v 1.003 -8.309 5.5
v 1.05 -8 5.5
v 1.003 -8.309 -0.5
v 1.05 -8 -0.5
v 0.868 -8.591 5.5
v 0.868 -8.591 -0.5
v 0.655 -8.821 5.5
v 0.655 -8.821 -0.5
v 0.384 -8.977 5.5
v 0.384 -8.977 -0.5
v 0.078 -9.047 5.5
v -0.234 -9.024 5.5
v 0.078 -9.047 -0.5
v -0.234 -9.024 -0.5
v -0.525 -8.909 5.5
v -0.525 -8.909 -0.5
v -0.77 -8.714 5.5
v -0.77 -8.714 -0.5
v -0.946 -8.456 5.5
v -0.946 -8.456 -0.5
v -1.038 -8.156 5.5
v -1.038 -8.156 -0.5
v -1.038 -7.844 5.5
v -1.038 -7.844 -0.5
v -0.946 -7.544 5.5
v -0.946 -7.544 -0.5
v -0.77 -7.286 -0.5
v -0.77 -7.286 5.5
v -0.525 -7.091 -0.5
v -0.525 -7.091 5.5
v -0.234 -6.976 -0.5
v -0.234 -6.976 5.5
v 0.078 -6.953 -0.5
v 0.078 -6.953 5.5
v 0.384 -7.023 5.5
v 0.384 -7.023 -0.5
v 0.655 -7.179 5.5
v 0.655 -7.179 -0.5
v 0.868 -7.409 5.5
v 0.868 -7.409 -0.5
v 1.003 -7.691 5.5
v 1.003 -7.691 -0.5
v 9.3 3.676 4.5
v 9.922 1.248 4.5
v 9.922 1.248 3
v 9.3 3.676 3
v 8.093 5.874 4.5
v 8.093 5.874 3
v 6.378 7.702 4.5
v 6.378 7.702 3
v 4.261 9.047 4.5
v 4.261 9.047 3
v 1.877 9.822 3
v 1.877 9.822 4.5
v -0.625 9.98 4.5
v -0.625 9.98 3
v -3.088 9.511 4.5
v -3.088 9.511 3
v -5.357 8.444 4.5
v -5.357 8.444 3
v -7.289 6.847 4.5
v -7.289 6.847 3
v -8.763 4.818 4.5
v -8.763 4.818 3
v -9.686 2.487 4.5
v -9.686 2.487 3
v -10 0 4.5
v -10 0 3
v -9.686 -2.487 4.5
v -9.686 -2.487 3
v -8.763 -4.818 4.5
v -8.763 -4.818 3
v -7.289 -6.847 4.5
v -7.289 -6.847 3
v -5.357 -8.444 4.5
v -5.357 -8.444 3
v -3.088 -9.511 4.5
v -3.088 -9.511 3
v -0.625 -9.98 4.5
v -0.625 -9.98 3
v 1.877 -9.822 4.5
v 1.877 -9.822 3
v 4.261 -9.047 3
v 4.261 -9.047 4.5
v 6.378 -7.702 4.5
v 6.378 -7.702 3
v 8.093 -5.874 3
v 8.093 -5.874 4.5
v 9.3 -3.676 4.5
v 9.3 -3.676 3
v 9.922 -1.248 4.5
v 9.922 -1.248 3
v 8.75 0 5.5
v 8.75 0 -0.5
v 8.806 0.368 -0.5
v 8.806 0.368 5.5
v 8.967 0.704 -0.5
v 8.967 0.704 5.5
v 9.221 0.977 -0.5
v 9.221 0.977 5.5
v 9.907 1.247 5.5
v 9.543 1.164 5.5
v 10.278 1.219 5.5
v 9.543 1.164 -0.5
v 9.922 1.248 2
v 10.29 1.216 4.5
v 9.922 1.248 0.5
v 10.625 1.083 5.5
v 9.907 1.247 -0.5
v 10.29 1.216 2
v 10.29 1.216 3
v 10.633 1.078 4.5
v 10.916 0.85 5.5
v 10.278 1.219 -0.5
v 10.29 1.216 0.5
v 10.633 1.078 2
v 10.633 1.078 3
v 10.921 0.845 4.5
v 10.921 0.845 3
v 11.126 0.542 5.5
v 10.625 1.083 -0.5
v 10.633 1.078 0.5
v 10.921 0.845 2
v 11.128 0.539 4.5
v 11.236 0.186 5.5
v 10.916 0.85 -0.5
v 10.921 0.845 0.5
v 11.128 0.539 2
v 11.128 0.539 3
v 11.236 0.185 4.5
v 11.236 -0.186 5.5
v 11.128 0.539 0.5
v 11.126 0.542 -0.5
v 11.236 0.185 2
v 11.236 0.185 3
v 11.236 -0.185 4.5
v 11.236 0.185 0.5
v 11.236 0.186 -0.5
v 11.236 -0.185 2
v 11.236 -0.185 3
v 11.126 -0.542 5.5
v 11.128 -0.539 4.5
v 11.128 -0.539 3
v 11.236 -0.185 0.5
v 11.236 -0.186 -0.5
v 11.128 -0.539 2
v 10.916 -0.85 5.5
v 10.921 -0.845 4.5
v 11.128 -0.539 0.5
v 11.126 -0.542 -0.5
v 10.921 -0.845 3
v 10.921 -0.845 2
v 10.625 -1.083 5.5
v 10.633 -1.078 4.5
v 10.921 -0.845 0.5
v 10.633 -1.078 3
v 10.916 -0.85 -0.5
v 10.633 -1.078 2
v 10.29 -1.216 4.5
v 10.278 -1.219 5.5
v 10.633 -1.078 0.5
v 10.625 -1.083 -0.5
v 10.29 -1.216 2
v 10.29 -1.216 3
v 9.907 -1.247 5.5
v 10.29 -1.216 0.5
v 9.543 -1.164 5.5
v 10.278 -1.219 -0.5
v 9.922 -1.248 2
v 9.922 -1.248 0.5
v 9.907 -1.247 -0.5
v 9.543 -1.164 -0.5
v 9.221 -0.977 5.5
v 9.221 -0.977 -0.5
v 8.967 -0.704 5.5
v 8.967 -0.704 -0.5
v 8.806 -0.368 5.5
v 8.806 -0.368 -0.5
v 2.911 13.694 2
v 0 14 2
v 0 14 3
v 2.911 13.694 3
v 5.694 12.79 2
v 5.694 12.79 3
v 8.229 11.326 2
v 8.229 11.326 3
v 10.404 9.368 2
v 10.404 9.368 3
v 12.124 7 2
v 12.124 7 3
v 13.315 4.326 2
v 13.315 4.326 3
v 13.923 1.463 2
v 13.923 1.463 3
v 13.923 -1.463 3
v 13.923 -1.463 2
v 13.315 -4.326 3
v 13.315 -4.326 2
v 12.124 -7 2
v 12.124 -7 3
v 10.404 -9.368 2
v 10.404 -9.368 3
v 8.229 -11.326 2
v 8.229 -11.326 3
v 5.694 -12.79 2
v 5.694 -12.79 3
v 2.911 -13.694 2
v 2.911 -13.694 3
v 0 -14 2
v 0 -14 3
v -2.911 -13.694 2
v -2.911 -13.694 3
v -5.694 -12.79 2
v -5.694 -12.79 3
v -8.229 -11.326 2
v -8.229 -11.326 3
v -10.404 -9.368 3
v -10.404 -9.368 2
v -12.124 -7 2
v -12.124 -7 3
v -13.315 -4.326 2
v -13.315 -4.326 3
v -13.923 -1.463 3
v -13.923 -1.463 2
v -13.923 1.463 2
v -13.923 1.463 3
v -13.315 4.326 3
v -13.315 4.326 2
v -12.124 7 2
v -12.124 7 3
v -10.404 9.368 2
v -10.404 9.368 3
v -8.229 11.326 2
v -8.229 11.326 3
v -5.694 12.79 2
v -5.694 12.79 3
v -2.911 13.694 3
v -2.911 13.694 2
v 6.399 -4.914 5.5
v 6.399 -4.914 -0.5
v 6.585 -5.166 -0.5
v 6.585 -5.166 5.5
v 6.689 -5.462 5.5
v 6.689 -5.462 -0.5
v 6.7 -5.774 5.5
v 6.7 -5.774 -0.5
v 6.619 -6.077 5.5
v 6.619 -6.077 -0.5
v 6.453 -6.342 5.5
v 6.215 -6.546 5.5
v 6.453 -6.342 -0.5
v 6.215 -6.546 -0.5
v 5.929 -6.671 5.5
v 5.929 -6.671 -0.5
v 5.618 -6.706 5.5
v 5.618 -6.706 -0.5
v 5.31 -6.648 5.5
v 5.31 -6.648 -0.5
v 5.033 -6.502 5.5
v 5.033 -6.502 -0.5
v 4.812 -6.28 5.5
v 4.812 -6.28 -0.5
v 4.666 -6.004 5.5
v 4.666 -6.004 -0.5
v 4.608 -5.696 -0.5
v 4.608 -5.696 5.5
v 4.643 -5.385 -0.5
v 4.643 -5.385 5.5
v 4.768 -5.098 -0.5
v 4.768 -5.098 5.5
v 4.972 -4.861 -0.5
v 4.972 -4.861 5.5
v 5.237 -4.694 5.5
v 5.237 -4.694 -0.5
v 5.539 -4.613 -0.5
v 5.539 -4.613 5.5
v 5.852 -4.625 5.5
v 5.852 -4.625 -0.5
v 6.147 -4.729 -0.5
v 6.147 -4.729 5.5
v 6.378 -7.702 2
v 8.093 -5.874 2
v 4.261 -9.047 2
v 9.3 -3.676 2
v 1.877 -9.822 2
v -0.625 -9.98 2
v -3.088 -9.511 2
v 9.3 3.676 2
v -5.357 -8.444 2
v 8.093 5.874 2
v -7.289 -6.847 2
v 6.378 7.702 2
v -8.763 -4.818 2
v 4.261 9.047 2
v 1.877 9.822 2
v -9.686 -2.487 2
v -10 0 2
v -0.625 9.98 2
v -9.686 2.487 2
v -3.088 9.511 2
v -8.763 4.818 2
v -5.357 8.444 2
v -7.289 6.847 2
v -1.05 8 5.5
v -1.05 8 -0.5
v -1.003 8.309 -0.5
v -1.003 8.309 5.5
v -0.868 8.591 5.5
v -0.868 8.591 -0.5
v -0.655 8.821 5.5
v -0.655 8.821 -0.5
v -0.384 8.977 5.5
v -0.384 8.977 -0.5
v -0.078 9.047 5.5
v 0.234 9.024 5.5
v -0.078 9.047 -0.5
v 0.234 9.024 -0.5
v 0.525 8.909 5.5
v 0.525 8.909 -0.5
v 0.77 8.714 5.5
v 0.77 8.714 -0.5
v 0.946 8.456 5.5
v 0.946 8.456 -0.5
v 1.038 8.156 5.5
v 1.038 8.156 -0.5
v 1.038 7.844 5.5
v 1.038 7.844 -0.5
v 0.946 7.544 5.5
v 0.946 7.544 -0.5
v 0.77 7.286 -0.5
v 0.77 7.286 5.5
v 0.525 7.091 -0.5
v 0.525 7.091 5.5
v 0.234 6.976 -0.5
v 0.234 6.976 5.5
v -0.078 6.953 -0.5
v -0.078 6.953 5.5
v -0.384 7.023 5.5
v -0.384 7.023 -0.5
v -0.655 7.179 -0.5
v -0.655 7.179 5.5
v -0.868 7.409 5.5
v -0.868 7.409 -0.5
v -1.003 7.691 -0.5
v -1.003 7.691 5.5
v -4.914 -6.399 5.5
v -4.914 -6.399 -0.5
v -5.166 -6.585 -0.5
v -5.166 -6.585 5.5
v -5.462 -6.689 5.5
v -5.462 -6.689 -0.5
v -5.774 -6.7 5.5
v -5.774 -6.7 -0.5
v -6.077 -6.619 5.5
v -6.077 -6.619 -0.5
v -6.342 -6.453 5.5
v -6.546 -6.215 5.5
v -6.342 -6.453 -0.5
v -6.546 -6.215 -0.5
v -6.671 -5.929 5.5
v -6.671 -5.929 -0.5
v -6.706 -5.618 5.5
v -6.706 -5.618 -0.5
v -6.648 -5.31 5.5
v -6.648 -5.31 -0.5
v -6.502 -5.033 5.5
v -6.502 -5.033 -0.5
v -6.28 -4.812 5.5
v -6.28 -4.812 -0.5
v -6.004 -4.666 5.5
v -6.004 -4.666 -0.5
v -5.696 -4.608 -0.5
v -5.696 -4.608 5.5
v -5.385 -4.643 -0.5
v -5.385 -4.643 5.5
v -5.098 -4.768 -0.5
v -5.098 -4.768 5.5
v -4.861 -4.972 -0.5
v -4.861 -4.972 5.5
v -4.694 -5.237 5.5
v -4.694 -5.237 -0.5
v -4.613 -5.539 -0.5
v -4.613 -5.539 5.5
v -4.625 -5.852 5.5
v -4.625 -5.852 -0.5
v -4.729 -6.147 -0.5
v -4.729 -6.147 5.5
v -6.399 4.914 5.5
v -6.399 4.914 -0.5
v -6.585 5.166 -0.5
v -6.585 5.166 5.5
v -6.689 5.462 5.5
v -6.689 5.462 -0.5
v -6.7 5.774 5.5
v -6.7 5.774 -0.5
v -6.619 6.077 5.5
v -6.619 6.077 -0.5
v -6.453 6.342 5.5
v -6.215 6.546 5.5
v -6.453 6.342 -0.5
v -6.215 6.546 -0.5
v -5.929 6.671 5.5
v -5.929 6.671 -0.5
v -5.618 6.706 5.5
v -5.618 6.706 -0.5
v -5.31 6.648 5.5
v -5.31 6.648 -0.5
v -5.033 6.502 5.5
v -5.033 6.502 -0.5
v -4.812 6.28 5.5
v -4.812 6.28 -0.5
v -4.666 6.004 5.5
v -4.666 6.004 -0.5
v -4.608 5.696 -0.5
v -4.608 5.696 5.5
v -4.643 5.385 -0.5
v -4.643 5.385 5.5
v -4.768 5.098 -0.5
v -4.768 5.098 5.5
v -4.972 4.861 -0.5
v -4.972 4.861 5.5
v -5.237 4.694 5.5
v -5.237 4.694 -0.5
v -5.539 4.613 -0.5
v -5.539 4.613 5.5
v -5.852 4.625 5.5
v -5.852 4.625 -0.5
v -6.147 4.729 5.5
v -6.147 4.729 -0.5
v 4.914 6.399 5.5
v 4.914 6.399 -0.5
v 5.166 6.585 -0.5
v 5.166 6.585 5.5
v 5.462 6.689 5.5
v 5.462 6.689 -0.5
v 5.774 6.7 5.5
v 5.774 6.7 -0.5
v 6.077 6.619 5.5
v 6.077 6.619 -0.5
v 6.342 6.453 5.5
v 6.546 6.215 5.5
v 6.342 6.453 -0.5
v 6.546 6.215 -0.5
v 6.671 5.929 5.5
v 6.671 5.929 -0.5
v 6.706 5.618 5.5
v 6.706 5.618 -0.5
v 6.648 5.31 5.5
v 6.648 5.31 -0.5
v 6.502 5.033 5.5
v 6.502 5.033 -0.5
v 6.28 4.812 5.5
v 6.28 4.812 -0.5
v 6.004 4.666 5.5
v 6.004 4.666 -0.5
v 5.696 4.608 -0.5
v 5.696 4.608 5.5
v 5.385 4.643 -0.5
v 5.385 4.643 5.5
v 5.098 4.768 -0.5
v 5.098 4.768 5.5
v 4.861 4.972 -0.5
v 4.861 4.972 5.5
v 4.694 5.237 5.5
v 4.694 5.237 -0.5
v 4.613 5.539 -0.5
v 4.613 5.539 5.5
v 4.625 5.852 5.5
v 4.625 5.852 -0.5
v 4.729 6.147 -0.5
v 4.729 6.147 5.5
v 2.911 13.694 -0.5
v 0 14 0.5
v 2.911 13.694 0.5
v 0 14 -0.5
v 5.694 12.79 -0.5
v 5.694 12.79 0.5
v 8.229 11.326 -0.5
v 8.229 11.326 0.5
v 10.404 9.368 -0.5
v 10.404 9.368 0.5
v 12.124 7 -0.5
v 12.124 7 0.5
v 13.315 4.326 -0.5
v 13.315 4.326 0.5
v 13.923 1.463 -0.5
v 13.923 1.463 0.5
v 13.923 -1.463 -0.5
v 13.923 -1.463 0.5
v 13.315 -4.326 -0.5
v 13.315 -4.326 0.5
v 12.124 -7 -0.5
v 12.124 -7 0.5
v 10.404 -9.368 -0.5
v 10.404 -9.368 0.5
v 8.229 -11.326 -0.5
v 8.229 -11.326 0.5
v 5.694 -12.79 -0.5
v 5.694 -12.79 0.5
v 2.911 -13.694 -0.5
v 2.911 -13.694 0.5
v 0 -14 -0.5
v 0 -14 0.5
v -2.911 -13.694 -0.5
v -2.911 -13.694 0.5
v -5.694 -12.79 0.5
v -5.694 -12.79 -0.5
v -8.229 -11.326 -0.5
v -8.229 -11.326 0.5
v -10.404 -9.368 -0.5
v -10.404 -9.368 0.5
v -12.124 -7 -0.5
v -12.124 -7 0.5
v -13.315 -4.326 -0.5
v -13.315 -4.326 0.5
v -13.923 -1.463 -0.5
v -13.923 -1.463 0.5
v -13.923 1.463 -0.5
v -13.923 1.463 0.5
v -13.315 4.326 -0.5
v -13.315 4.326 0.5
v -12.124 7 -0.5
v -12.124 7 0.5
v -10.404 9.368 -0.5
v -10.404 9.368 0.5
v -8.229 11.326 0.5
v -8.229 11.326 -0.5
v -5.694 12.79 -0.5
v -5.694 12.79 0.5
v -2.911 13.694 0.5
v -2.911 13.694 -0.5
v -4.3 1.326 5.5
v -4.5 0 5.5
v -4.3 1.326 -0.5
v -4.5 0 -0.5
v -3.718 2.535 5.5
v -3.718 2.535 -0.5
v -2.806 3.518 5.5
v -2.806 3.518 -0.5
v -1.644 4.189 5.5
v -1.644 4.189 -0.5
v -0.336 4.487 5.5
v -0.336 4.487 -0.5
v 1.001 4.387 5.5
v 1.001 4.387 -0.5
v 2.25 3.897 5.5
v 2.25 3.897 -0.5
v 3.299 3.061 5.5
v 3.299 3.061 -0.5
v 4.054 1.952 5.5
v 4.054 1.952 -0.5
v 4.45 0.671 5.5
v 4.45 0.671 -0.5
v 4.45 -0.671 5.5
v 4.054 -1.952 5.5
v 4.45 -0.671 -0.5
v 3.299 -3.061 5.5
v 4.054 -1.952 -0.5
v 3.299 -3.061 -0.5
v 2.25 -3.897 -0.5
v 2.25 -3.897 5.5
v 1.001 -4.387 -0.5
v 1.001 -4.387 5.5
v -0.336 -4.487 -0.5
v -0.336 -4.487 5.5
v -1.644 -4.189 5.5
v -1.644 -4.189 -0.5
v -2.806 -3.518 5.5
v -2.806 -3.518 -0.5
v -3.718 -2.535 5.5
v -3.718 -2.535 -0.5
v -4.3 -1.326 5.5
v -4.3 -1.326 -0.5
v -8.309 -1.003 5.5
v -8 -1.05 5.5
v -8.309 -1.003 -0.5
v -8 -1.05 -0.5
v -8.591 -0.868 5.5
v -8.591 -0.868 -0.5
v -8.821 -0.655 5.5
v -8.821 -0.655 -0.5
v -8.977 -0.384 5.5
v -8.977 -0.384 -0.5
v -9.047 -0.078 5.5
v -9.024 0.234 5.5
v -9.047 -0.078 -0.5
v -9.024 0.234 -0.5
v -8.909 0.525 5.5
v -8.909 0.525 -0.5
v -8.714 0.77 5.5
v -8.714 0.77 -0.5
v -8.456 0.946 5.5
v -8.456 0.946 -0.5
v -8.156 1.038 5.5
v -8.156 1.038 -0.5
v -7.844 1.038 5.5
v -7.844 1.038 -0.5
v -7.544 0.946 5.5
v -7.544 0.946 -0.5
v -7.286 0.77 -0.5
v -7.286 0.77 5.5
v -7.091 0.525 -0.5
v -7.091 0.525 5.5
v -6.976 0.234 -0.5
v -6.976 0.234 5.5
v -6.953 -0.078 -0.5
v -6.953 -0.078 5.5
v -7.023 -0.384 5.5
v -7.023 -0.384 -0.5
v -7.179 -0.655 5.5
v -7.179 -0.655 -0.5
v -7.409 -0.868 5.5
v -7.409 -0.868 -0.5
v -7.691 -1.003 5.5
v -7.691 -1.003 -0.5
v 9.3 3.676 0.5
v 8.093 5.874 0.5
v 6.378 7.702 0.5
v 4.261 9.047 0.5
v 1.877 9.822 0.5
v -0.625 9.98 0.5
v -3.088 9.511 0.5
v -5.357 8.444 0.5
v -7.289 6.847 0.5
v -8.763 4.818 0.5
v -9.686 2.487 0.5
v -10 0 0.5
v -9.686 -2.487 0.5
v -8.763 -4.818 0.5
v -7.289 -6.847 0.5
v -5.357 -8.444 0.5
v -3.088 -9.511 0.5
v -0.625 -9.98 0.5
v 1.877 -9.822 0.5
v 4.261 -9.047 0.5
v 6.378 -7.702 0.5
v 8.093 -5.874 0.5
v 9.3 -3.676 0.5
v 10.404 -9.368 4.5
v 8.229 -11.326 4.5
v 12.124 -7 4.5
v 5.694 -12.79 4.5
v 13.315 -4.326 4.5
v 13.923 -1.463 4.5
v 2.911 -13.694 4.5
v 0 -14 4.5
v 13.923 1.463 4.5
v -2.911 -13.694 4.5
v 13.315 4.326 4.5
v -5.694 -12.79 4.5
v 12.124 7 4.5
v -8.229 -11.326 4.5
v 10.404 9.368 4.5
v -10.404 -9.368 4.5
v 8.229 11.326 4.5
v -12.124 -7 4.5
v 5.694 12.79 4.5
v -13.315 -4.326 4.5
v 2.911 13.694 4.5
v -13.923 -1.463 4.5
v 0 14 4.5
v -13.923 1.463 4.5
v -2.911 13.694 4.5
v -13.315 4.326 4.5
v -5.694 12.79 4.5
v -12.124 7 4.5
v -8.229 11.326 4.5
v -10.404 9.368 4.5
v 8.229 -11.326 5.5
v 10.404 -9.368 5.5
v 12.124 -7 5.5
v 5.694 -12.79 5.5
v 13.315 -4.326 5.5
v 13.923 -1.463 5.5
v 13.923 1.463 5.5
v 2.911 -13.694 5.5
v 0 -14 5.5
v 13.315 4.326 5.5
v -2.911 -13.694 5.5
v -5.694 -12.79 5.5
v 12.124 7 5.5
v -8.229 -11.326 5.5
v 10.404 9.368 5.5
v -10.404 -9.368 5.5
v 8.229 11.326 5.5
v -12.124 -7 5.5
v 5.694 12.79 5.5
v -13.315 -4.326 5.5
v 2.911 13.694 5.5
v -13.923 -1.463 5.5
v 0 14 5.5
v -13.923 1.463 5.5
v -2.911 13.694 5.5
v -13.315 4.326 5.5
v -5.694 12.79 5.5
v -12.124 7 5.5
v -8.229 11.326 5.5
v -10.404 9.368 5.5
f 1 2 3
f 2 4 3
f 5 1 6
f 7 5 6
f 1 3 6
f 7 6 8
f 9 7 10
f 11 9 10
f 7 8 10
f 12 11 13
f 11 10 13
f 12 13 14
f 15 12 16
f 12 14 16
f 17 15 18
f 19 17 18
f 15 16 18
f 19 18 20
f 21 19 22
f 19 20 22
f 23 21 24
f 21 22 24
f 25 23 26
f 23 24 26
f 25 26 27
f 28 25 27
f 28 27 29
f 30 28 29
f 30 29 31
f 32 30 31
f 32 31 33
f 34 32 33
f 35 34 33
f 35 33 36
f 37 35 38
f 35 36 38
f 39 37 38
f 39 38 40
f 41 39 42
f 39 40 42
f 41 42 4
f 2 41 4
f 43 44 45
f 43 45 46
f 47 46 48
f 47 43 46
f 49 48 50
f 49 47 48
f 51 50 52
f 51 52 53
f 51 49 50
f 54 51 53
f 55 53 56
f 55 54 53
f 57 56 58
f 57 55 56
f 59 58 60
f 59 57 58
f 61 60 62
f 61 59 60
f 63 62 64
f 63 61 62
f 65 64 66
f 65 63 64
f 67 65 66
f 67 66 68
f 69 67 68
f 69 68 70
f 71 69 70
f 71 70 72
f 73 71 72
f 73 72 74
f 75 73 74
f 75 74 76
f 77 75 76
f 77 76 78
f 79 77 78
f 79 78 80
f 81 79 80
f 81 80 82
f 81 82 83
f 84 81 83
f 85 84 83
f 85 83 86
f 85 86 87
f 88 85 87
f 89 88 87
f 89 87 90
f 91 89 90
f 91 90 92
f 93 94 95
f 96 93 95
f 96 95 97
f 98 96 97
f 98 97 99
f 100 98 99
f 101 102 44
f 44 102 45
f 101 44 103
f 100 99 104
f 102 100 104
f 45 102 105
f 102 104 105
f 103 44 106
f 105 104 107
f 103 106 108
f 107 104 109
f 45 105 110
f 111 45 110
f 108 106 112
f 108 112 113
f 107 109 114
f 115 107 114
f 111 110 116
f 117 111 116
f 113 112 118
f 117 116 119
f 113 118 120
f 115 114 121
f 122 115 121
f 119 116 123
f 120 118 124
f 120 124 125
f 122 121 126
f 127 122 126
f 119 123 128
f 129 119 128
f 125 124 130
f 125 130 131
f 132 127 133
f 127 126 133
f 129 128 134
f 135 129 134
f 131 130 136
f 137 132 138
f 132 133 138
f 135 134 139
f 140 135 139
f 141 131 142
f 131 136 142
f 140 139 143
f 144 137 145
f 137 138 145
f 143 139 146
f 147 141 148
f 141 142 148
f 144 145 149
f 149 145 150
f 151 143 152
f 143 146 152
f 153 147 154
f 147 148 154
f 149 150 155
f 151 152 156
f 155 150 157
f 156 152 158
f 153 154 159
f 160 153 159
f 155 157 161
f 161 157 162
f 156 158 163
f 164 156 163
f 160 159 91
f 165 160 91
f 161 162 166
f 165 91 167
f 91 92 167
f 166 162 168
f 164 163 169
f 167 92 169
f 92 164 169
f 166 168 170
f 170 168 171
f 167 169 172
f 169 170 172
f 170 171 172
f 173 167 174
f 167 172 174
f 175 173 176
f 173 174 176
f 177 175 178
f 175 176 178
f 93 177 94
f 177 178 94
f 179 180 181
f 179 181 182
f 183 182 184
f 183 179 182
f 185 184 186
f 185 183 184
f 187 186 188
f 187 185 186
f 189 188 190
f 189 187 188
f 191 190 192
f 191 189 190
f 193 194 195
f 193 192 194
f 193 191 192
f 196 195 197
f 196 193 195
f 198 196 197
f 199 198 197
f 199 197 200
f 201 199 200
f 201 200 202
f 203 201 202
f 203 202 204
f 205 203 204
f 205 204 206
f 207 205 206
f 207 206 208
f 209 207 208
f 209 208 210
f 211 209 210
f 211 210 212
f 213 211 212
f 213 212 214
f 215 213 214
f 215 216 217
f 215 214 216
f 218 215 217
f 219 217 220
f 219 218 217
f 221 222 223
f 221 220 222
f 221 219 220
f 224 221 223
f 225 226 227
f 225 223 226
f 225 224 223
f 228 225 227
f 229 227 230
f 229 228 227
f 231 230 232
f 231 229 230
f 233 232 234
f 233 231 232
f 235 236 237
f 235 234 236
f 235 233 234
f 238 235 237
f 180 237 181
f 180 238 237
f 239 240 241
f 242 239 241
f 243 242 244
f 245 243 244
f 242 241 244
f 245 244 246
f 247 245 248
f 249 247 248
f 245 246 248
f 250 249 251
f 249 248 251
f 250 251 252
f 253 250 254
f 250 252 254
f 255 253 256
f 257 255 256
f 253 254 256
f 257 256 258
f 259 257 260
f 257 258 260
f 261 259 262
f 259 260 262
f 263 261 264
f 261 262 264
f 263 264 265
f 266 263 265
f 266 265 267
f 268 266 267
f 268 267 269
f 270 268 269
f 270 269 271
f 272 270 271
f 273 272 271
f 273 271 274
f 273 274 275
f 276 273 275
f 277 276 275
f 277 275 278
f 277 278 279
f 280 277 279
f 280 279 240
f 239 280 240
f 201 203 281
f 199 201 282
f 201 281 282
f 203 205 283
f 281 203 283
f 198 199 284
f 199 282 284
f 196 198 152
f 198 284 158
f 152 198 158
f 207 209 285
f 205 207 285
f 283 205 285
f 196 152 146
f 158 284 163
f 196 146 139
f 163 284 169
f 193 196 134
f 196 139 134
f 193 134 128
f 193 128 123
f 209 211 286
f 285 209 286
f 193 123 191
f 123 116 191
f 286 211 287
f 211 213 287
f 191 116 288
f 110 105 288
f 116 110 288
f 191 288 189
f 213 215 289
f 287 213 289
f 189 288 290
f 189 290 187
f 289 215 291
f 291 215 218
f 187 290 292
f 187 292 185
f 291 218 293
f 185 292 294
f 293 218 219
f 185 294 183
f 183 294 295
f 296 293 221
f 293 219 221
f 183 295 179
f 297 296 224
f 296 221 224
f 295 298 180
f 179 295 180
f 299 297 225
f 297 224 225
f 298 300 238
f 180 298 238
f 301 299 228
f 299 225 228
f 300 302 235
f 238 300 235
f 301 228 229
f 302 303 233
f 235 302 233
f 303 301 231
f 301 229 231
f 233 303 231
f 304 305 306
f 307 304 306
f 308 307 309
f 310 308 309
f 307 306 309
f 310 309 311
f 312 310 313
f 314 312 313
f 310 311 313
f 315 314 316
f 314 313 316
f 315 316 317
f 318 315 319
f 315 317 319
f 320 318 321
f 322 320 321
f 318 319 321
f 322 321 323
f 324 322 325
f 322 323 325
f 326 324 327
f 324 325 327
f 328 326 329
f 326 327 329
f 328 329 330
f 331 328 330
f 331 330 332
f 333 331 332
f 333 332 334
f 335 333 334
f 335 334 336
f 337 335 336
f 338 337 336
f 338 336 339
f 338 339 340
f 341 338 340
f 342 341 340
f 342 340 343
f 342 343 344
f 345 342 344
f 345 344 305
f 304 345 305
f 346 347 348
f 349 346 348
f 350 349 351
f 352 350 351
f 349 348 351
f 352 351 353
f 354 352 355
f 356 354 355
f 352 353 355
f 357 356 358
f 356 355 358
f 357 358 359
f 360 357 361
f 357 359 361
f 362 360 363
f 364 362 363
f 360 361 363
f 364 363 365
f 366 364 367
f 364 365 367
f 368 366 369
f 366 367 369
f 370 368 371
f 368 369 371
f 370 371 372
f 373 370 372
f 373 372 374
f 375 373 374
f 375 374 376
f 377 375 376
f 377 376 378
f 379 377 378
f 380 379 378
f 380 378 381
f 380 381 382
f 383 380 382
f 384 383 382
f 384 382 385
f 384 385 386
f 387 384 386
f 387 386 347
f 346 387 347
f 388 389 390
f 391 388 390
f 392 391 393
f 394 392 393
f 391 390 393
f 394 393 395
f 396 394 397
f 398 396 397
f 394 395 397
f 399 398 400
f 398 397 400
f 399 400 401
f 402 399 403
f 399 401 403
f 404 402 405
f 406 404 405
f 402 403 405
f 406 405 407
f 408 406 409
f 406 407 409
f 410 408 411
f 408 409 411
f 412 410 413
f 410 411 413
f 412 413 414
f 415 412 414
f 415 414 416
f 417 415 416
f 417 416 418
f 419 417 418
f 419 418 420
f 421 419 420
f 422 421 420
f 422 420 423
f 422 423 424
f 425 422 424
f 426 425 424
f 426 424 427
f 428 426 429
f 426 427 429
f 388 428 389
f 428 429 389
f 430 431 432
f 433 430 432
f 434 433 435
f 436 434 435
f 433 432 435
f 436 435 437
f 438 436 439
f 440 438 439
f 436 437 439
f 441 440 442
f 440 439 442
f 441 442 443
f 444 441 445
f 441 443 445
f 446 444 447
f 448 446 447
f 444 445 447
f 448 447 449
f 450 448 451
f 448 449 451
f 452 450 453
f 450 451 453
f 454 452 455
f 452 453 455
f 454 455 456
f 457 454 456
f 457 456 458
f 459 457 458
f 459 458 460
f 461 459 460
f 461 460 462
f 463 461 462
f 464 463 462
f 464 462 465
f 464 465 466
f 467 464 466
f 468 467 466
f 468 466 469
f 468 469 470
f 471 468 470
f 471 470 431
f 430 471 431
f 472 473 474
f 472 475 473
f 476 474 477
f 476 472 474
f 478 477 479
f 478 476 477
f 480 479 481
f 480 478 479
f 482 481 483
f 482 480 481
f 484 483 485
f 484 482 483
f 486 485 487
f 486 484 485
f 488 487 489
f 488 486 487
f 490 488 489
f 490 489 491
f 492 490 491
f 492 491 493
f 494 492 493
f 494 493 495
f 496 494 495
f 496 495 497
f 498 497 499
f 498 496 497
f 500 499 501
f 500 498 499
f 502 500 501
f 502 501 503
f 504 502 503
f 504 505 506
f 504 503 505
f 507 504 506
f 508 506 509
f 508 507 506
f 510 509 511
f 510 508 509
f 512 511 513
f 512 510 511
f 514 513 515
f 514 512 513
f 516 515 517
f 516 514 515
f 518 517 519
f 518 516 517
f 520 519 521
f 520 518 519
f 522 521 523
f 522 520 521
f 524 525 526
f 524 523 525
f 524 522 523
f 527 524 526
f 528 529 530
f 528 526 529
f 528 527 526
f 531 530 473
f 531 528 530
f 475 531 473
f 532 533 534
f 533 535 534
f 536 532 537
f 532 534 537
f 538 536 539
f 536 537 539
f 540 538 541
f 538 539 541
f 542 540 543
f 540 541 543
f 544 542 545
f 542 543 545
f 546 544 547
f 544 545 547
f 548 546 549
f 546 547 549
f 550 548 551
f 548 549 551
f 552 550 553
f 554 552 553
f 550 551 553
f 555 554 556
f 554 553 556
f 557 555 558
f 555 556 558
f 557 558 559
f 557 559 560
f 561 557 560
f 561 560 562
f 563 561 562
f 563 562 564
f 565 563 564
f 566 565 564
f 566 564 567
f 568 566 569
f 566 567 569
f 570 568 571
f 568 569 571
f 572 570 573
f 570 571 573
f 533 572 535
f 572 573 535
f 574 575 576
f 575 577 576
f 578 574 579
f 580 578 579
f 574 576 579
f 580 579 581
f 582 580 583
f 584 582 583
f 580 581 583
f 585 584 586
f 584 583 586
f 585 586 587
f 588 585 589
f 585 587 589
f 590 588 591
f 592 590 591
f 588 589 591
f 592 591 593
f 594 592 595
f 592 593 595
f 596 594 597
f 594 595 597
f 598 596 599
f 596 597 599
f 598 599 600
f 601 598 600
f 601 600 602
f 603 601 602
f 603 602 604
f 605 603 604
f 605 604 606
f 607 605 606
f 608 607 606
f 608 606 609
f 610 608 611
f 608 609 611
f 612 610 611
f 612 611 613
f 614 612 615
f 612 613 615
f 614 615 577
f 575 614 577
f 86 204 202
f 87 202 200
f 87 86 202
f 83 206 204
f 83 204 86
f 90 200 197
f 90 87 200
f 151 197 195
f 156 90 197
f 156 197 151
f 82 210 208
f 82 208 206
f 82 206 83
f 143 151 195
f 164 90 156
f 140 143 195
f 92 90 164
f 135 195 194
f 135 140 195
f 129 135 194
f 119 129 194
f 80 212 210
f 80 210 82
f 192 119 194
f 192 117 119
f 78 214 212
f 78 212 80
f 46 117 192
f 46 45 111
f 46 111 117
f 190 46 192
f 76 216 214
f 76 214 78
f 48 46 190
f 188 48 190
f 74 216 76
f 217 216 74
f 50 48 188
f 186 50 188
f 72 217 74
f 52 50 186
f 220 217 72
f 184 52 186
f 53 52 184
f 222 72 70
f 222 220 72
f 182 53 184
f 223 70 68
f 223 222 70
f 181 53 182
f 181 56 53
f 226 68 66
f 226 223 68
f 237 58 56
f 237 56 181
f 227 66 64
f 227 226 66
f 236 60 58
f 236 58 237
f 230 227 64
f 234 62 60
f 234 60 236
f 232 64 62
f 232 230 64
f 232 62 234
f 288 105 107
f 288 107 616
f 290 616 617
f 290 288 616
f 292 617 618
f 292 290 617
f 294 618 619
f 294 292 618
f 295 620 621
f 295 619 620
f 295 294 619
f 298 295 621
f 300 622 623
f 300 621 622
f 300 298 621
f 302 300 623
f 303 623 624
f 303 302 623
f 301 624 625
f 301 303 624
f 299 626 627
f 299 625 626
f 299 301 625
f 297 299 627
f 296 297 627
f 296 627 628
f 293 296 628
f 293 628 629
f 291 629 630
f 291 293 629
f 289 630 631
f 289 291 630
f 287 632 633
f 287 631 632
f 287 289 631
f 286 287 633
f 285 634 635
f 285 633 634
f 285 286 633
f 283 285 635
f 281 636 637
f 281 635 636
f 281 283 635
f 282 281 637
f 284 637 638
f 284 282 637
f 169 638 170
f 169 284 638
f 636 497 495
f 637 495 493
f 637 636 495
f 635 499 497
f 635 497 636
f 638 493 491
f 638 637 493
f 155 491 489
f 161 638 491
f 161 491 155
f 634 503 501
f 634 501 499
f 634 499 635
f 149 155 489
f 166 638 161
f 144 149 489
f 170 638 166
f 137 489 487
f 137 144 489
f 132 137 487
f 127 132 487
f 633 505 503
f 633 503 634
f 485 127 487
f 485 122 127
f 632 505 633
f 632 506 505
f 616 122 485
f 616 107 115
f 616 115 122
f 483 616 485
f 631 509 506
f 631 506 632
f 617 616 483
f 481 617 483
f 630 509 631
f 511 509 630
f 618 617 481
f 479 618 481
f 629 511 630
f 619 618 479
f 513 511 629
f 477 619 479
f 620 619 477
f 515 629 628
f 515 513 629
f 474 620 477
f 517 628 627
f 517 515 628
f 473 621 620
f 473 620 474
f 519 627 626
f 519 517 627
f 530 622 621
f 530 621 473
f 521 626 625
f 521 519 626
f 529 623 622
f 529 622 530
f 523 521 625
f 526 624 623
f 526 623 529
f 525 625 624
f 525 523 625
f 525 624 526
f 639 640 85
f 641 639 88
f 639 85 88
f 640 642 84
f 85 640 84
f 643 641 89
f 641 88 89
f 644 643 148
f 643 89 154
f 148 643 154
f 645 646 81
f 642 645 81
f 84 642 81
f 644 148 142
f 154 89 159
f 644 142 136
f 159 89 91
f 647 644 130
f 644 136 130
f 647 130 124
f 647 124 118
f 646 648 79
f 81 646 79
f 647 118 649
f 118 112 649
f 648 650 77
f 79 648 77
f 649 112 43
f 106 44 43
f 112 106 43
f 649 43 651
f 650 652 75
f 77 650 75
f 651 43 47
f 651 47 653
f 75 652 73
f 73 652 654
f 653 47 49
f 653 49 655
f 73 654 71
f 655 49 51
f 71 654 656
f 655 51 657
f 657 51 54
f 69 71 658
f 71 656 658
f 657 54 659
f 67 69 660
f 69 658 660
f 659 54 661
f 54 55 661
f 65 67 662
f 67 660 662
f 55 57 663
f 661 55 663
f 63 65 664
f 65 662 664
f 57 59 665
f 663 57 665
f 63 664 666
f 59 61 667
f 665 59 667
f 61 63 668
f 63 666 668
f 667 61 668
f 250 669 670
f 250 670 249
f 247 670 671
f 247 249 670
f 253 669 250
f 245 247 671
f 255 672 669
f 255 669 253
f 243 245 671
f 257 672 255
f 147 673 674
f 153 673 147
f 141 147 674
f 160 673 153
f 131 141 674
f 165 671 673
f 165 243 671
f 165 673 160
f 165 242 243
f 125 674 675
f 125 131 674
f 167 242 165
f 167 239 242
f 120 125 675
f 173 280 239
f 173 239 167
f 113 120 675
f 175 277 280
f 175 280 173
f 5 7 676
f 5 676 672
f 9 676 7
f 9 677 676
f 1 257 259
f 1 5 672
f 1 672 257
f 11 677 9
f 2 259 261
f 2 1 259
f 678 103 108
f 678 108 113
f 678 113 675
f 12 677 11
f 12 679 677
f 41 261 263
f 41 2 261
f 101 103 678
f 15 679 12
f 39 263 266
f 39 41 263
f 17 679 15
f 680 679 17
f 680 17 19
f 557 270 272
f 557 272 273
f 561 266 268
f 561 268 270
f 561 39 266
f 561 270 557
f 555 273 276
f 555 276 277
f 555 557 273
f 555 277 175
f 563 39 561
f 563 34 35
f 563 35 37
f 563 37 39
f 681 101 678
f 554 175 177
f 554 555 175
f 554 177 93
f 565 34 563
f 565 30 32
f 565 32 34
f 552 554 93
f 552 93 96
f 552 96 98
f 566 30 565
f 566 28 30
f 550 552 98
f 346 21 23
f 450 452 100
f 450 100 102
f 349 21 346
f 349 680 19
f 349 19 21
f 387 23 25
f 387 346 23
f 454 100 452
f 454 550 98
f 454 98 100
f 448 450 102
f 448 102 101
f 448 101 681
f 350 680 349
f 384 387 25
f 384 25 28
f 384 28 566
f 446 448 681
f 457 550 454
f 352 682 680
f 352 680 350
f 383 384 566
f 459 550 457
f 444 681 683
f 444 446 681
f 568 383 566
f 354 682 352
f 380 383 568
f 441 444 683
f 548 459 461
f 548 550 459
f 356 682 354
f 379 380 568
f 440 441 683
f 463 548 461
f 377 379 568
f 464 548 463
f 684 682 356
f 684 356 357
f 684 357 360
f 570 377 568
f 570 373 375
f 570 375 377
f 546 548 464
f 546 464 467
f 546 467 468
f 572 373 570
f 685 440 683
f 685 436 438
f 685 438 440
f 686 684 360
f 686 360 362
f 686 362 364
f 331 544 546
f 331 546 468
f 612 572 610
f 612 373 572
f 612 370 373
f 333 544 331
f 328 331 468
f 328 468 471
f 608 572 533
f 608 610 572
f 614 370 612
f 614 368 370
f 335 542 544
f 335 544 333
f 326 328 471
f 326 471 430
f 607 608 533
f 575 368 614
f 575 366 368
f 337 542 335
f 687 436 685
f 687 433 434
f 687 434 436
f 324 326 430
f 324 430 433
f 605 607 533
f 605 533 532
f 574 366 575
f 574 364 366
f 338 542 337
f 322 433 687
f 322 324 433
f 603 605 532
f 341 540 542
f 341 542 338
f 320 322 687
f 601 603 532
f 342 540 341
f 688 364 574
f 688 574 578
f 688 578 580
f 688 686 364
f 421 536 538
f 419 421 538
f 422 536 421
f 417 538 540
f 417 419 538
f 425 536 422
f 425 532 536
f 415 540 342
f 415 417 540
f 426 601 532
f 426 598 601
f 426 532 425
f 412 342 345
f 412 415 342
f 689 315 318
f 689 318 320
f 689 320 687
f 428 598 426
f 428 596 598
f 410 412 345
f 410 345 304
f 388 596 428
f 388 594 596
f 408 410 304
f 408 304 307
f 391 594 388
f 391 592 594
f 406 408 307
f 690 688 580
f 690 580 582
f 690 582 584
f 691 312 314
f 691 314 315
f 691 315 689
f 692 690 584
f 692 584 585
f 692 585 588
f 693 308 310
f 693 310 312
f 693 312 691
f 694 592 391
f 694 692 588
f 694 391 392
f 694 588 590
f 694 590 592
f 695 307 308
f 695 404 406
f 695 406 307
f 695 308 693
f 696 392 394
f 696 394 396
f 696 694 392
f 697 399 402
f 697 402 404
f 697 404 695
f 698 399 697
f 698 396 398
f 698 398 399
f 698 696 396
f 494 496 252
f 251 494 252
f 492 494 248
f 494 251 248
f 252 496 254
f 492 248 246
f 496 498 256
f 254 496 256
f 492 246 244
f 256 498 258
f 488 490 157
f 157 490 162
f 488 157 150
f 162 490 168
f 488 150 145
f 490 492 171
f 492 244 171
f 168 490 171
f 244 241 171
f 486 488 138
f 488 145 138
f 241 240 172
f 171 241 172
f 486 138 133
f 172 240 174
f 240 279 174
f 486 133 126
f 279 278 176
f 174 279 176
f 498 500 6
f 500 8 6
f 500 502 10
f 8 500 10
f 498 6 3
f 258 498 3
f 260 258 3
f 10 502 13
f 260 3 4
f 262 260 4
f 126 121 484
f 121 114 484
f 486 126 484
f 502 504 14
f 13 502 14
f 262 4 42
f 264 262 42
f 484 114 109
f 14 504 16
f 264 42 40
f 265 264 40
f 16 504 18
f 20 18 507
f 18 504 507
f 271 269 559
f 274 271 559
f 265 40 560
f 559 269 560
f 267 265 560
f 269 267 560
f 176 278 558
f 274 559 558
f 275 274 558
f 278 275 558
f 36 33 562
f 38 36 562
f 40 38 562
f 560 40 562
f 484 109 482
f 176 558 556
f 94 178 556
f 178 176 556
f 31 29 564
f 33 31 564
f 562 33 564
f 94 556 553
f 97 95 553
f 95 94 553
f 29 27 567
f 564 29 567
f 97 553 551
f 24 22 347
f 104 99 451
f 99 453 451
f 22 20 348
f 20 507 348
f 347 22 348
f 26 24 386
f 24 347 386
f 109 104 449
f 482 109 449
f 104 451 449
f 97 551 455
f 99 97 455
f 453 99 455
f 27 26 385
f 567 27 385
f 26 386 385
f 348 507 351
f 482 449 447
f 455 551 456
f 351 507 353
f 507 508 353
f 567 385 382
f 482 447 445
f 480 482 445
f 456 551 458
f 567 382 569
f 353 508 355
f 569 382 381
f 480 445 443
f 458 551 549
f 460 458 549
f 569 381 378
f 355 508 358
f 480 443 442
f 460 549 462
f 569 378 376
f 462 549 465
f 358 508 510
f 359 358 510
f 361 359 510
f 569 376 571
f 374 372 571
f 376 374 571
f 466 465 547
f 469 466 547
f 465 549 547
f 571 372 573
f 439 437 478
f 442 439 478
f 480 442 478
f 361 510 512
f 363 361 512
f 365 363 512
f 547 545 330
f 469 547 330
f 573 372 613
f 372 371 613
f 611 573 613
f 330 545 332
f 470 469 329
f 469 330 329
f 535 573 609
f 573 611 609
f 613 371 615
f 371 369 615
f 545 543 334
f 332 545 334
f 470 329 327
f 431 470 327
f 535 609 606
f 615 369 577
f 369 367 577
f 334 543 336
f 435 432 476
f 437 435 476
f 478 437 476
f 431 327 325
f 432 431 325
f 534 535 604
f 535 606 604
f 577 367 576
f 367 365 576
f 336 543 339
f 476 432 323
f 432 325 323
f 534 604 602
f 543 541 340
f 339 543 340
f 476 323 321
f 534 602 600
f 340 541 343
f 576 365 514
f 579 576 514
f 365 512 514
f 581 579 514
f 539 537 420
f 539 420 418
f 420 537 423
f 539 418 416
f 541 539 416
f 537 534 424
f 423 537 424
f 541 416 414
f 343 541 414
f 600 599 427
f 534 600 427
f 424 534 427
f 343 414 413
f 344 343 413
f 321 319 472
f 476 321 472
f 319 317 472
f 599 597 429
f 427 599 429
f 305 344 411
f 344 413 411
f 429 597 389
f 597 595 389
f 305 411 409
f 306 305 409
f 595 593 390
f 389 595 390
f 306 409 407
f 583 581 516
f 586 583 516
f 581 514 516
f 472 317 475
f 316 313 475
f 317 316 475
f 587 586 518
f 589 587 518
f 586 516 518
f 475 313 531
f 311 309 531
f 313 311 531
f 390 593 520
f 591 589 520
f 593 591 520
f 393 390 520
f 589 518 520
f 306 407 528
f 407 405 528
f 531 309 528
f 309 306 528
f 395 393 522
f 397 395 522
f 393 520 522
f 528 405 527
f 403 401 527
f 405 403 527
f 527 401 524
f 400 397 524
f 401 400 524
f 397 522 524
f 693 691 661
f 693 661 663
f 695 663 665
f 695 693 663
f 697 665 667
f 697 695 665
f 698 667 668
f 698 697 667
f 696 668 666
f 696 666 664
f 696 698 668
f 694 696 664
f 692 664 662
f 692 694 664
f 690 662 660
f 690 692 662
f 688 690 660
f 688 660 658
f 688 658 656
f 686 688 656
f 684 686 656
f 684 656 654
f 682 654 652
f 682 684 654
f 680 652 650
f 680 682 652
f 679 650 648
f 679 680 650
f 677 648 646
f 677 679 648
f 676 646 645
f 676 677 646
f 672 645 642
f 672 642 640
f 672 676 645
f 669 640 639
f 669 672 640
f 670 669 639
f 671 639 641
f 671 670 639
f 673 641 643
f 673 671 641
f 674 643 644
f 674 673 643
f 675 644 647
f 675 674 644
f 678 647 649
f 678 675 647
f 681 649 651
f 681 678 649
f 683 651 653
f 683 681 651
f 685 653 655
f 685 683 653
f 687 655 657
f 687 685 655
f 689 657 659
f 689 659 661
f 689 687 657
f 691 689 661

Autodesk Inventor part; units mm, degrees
ref_plane "YZ Plane" through (0, 0, 0) normal (1, 0, 0) x (0, 1, 0)
ref_plane "XZ Plane" through (0, 0, 0) normal (0, 1, 0) x (-1, 0, 0)
ref_plane "XY Plane" through (0, 0, 0) normal (0, 0, 1) x (1, 0, 0)
sketch "Sketch1" plane through (0, 0, 0) normal (1, 0, 0) x (0, 1, 0)
  line L0 (0, 3) -> (14, 3)
  line L1 (14, 3) -> (14, -0.5)
  line L2 (14, -0.5) -> (0, -0.5)
  line L3 (0, -0.5) -> (0, 3)
  line L4 (0, -1.7) -> (0, 6.7) projected
  line L5 (14, 2) -> (14, 0.5)
  line L6 (14, 0.5) -> (10, 0.5)
  line L7 (10, 0.5) -> (10, 2)
  line L8 (10, 2) -> (14, 2)
  line L9 (10, 3) -> (10, 4.5)
  line L10 (10, 4.5) -> (14, 4.5)
  line L11 (14, 4.5) -> (14, 5.5)
  line L12 (14, 5.5) -> (0, 5.5)
  point P0 (0, 0)
  dimension "d0" = 3.5
  dimension "d1" = 3
  dimension "d2" = 14
  dimension "d4" = 1
  dimension "d5" = 1
  dimension "d19" = 4
  dimension "d26" = 1.5
  dimension "d27" = 1
revolve "Revolution1" add sketch "Sketch1" angle 360 about axis through (0, 0, -10) along (0, 0, 1) contours L4 L12 L11 L10 L9 L0 | L0 L1 L8 L7 L6 L2 L3
sketch "Sketch2" plane through (0, 0, -0.5) normal (0, 0, -1) x (-1, 0, 0)
  circle A0 centre (0, 8) radius 1.05
  circle A1 centre (0, 0) radius 4.5
  dimension "d7" = 2.1
  dimension "d8" = 8
  dimension "d9" = 9
extrude "Extrusion1" cut sketch "Sketch2" against normal blind 100
pattern_circular "Circular Pattern1" count 8 over 360 about axis through (0, 0, -10) along (0, 0, 1) of "Extrusion1"
sketch "Sketch3" plane through (0, 0, -0.5) normal (0, 0, -1) x (-1, 0, 0)
  circle A0 centre (-10, 0) radius 1.25
  circle A1 centre (-8, 0) radius 1.05 projected
  point P0 (0, 0)
  point P1 (-8.885, -0.565)
  point P2 (-8.885, 0.565)
  dimension "d15" = 2.5
  dimension "d16" = 10
extrude "Extrusion2" add sketch "Sketch3" against normal blind 6
extrude "Extrusion5" cut sketch "Sketch3" against normal blind 100 contours A0 A1 | A1 A0 picked at (-8.9455, 0) picked at (-10.5022, 0.1399)
properties part number "Motor_pulley"
